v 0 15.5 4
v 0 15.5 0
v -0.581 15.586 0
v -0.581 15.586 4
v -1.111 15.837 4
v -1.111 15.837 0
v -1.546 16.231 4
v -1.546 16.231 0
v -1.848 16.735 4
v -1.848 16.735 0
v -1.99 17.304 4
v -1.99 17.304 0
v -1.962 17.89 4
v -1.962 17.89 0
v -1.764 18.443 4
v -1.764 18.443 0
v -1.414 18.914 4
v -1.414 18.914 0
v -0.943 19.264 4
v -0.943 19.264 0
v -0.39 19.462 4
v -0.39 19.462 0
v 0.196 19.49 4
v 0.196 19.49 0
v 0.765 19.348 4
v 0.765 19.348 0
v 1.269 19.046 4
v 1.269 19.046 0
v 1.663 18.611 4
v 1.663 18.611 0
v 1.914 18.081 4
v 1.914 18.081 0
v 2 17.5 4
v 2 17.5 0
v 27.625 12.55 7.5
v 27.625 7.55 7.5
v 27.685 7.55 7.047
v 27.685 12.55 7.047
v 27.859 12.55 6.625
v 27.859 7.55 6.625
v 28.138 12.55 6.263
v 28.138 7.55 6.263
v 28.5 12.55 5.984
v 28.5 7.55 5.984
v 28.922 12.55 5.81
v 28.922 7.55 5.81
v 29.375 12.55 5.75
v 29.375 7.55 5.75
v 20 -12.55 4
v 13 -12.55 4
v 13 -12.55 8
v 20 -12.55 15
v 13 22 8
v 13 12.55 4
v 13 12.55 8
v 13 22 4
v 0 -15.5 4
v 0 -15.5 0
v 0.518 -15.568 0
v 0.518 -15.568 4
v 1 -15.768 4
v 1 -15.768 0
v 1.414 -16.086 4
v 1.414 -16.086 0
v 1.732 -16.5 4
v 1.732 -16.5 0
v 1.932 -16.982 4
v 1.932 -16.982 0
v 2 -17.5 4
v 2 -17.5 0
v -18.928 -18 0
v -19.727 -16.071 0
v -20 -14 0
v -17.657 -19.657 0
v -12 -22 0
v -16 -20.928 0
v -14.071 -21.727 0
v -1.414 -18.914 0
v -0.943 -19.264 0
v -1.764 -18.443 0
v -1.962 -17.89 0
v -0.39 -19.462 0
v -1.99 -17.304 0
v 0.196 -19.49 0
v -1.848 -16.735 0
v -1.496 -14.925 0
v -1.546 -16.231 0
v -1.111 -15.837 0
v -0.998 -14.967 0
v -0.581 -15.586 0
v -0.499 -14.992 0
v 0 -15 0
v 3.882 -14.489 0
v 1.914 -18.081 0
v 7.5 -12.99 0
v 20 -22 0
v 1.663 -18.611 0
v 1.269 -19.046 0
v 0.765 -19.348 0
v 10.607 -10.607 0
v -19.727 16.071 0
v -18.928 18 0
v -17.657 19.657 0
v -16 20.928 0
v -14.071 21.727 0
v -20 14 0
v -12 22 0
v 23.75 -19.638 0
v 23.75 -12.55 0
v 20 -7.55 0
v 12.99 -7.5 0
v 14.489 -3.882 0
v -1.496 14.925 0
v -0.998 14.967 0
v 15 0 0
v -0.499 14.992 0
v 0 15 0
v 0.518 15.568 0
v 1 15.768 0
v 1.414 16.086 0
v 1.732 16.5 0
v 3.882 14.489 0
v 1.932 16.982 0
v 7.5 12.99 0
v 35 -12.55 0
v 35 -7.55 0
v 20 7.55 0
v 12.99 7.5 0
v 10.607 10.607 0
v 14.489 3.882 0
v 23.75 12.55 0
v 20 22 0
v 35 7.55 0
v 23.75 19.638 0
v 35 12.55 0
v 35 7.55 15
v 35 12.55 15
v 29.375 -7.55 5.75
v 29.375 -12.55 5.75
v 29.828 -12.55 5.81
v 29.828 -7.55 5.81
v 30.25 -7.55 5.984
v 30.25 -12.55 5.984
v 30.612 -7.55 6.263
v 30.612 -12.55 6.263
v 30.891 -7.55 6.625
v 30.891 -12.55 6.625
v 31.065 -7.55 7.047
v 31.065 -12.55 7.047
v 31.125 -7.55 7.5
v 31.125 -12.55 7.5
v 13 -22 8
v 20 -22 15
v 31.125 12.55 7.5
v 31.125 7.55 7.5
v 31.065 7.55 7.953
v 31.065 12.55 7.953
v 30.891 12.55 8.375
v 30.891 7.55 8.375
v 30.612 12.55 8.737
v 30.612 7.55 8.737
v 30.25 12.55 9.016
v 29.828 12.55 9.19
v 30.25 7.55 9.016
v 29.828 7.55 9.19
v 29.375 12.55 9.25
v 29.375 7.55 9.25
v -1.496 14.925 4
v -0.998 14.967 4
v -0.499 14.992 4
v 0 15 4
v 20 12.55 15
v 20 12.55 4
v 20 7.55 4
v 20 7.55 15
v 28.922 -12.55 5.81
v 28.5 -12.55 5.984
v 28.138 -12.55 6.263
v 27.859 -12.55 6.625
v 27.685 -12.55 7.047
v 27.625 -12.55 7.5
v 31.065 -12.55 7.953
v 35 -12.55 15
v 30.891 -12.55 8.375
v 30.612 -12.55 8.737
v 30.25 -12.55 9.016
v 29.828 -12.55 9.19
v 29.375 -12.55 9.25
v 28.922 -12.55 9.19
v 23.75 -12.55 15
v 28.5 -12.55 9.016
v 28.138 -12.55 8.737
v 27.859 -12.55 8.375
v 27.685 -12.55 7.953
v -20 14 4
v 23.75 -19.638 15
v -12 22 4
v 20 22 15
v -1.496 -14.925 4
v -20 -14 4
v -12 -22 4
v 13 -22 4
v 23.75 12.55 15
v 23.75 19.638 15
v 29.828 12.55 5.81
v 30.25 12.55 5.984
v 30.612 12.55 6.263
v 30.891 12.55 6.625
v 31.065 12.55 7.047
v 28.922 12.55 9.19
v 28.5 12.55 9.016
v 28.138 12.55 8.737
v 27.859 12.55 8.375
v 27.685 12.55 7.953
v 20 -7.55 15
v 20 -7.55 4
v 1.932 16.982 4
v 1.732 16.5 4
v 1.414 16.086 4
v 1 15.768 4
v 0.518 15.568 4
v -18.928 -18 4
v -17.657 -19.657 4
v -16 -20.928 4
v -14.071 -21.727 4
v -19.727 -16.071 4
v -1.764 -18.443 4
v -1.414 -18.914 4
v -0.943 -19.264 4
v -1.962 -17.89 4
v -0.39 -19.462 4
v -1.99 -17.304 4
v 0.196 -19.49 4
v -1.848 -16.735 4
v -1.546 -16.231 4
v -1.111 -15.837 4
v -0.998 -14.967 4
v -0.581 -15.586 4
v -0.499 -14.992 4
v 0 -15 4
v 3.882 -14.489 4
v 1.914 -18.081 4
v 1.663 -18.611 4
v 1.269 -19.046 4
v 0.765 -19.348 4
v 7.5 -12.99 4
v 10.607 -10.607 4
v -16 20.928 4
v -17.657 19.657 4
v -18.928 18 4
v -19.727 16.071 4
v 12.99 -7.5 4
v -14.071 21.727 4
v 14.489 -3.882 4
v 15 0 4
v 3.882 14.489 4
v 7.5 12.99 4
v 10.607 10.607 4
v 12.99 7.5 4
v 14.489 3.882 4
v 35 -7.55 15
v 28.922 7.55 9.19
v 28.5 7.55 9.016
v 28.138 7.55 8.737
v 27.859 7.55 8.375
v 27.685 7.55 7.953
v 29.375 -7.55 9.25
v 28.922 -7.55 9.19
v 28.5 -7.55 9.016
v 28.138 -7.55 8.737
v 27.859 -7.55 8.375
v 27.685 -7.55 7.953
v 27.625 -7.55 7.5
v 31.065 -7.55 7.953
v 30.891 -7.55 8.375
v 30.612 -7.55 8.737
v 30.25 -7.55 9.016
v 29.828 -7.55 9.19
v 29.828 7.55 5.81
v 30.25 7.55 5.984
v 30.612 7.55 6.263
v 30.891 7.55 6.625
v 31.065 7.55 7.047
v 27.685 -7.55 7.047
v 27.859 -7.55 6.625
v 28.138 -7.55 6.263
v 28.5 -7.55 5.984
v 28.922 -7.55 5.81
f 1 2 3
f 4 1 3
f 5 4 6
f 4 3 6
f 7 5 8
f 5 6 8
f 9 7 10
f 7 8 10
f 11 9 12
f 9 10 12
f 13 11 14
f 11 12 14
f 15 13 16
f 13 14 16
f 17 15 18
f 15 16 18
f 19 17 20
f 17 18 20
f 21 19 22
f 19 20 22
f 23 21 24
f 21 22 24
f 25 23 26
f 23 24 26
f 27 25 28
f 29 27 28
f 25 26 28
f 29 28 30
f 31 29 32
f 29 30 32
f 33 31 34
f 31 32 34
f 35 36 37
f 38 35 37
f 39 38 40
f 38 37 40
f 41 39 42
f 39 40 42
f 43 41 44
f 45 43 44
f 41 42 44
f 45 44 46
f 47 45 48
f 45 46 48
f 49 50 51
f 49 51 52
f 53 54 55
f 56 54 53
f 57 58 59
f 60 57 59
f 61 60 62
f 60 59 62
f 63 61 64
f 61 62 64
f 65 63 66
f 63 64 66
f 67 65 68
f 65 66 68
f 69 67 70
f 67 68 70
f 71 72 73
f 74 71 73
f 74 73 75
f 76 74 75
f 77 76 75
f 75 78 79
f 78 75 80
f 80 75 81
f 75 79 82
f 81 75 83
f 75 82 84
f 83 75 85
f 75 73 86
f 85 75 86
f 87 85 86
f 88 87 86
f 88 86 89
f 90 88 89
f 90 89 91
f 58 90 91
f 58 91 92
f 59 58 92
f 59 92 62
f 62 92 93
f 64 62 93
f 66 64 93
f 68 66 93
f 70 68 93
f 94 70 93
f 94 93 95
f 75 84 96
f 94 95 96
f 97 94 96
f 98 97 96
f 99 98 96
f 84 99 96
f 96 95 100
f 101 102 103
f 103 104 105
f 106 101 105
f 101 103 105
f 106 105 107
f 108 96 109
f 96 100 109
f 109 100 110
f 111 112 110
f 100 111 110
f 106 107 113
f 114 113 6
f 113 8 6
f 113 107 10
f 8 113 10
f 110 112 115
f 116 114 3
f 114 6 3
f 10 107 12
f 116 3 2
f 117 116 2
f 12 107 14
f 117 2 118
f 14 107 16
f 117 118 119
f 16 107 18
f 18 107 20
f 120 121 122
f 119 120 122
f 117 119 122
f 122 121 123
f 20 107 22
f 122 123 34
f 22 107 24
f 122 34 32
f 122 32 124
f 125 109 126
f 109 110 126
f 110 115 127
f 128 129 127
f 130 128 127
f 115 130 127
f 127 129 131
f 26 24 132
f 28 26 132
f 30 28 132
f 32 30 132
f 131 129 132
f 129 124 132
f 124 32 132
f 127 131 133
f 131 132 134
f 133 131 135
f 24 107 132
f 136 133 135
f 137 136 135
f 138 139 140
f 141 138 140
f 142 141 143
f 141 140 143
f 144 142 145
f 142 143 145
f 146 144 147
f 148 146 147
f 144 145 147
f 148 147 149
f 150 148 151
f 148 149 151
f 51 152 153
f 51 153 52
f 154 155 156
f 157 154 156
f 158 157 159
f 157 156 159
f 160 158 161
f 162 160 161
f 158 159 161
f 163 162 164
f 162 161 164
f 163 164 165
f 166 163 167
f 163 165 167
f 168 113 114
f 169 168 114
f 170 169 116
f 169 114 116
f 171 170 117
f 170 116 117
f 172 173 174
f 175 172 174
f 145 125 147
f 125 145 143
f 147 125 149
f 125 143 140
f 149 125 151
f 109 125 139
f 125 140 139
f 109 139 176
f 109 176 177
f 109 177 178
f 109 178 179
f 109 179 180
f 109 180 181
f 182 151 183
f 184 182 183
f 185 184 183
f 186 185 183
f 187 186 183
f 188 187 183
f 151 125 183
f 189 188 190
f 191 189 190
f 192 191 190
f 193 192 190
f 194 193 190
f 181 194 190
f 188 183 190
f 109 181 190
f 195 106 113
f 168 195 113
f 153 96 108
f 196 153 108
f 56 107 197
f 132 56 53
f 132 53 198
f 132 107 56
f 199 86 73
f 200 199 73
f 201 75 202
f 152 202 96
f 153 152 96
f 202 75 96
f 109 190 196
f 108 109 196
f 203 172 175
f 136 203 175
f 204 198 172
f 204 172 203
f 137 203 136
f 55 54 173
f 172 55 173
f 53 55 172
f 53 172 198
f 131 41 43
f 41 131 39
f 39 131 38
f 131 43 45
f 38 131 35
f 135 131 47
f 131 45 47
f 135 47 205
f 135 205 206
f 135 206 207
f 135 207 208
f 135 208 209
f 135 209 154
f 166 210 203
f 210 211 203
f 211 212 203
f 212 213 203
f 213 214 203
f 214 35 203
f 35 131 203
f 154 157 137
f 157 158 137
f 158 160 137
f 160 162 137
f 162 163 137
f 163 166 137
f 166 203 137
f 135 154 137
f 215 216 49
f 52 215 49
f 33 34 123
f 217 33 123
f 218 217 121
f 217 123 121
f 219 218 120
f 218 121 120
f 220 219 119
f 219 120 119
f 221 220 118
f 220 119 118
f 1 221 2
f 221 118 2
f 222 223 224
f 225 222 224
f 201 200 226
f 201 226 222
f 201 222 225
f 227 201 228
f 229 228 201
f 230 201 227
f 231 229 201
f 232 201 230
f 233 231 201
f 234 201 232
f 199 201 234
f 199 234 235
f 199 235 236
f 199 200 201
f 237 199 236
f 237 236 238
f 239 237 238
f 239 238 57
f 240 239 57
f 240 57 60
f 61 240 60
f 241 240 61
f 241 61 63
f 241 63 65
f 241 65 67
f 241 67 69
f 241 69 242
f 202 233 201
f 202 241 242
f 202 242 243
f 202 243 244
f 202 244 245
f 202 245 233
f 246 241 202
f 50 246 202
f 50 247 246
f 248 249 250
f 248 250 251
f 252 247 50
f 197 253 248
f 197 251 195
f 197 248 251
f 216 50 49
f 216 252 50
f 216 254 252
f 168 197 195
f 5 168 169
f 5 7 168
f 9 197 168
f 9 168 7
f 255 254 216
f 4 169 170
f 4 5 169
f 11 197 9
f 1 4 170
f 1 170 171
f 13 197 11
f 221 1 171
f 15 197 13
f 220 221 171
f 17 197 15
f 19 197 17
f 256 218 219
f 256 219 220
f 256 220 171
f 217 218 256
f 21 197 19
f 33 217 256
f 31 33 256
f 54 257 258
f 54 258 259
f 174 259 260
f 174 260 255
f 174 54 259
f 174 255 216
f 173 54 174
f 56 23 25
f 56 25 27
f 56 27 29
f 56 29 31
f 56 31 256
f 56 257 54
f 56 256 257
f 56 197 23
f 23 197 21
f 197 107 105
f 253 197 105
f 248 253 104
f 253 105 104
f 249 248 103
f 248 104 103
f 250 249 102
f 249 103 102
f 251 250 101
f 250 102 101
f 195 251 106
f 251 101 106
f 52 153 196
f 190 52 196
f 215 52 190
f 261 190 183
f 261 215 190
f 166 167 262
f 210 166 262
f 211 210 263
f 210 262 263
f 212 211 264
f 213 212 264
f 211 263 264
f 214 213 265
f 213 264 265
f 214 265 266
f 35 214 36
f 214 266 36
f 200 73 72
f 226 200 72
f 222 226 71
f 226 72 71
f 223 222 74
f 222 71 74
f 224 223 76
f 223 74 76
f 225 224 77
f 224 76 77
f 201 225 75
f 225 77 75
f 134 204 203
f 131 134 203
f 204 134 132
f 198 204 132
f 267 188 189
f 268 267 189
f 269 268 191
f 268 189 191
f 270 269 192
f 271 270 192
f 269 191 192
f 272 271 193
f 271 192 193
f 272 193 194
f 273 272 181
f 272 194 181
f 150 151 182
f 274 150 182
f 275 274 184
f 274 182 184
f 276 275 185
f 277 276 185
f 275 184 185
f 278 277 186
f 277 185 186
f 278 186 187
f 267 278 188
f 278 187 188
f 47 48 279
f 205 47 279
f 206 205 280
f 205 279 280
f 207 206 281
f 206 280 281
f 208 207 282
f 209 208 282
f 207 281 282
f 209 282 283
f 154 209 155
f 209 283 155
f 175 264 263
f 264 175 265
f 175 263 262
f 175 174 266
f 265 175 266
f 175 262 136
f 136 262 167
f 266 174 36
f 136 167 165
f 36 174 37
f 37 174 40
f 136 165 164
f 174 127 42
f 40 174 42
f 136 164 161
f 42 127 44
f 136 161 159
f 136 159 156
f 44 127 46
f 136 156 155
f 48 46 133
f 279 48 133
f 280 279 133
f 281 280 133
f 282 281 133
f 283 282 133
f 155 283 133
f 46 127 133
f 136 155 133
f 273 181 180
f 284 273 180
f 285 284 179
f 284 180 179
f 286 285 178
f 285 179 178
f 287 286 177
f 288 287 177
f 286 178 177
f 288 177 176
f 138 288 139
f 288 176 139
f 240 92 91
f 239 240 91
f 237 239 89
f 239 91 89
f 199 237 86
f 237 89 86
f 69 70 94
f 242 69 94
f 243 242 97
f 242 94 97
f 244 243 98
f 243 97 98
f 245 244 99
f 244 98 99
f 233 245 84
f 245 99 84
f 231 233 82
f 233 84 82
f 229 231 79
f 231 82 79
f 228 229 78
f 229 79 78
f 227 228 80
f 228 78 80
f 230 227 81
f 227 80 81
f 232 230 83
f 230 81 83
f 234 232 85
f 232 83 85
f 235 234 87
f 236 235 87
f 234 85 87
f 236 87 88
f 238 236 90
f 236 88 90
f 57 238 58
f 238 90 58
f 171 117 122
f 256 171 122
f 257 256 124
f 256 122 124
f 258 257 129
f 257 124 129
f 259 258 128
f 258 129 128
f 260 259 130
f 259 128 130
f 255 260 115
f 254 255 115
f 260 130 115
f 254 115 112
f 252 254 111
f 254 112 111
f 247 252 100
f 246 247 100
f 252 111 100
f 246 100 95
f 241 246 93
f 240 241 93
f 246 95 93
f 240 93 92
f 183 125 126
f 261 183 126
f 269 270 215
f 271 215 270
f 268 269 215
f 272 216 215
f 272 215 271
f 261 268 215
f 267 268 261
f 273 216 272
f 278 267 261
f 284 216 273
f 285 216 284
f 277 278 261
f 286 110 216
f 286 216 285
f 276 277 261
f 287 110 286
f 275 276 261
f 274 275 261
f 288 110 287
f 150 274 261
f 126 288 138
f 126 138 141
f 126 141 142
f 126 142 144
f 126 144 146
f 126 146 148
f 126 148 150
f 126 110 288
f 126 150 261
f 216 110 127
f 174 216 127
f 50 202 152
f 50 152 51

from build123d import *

# Parameters (mm, degrees)
F1_DEPTH  = 4
F2_W      = 15
F2_H      = 5
F2_W_2    = 7
F2_H_2    = 9.45
F3_DEPTH  = 15
F4_SIZE   = 7
F6_DEPTH  = 25
F8_DEPTH  = 25
F10_DEPTH = 50


with BuildPart() as f1:
    # F0 (on Top) → F1 (new body)
    with BuildSketch(Plane.XY):
        with BuildLine():
            Line((20, -22), (20, 22))
            Line((20, 22), (-12, 22))
            ThreePointArc((-12, 22), (-17.6568542495, 19.6568542495), (-20, 14))
            Line((-20, 14), (-1.4962593516, 14.9251870324))
            ThreePointArc((-1.4962593516, 14.9251870324), (-0.7490642542, 14.9812850832), (0, 15))
            ThreePointArc((0, 15), (10.6066017178, 10.6066017178), (15, 0))
            ThreePointArc((15, 0), (10.6066017178, -10.6066017178), (0, -15))
            ThreePointArc((0, -15), (-0.7490642542, -14.9812850832), (-1.4962593516, -14.9251870324))
            Line((-1.4962593516, -14.9251870324), (-20, -14))
            ThreePointArc((-20, -14), (-17.6568542495, -19.6568542495), (-12, -22))
            Line((-12, -22), (20, -22))
        make_face()
        with BuildLine():
            ThreePointArc((2, -17.5), (-1.4142135624, -18.9142135624), (0, -15.5))
            ThreePointArc((0, -15.5), (1.4142135624, -16.0857864376), (2, -17.5))
        make_face(mode=Mode.SUBTRACT)
        with BuildLine():
            ThreePointArc((2, 17.5), (1.4142135624, 16.0857864376), (0, 15.5))
            ThreePointArc((0, 15.5), (-1.4142135624, 18.9142135624), (2, 17.5))
        make_face(mode=Mode.SUBTRACT)
    extrude(amount=F1_DEPTH)

    # F2 (on Top) → F3 (join)
    with BuildSketch(Plane.XY):
        with Locations((27.5, 10.05)):
            Rectangle(F2_W, F2_H)
        with Locations((27.5, -10.05)):
            Rectangle(F2_W, F2_H)
        Polygon((20, 22), (20, 12.55), (35, 12.55), align=None)
        with Locations((16.5, 17.275)):
            Rectangle(F2_W_2, F2_H_2)
        Polygon((35, -12.55), (20, -12.55), (20, -22), align=None)
        with Locations((16.5, -17.275)):
            Rectangle(F2_W_2, F2_H_2)
    extrude(amount=F3_DEPTH)

    # F4
    f4_edges = [f1.edges().sort_by_distance(p)[0] for p in [
        (13, 17.275, 15),
        (13, -17.275, 15),
    ]]
    chamfer(f4_edges, length=F4_SIZE)

    # F5 (on face) → F6 (cut)
    with BuildSketch(Plane.XY.offset(15)):
        Polygon((27.5, 12.55), (35, 12.55), (23.75, 19.6375), (23.75, 12.55), align=None)
    extrude(amount=-F6_DEPTH, mode=Mode.SUBTRACT)

    # F7 (on face) → F8 (cut)
    with BuildSketch(Plane.XY.offset(15)):
        Polygon((23.75, -19.6375), (35, -12.55), (27.5, -12.55), (23.75, -12.55), align=None)
    extrude(amount=-F8_DEPTH, mode=Mode.SUBTRACT)

    # F9 (on face) → F10 (cut)
    with BuildSketch(Plane.XZ.offset(12.55)):
        with BuildLine():
            Line((31.125, 7.5), (29.375, 7.5))
            Line((29.375, 7.5), (29.375, 5.75))
            ThreePointArc((29.375, 5.75), (30.6124368671, 6.2625631329), (31.125, 7.5))
        make_face()
        with BuildLine():
            ThreePointArc((31.125, 7.5), (30.6124368671, 8.7374368671), (29.375, 9.25))
            Line((29.375, 9.25), (29.375, 7.5))
            Line((29.375, 7.5), (31.125, 7.5))
        make_face()
        with BuildLine():
            Line((29.375, 7.5), (29.375, 9.25))
            ThreePointArc((29.375, 9.25), (28.1375631329, 8.7374368671), (27.625, 7.5))
            Line((27.625, 7.5), (29.375, 7.5))
        make_face()
        with BuildLine():
            Line((29.375, 5.75), (29.375, 7.5))
            Line((29.375, 7.5), (27.625, 7.5))
            ThreePointArc((27.625, 7.5), (28.1375631329, 6.2625631329), (29.375, 5.75))
        make_face()
    extrude(amount=-F10_DEPTH, mode=Mode.SUBTRACT)


solid = f1.part
